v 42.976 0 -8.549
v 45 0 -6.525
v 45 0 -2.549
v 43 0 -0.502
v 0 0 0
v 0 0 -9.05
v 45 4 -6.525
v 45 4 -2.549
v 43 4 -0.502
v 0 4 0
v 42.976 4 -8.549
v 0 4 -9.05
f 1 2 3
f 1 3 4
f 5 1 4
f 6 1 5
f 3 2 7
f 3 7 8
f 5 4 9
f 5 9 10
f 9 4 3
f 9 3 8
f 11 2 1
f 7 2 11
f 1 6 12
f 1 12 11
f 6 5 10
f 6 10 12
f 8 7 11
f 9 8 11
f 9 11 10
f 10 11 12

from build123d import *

# Parameters (mm, degrees)
BOSS_EXTRUDE1_DEPTH   = 4
CHAMFER2_SIZE2        = 2
CHAMFER2_SIZE         = 2.023746482
CHAMFER2_EDGE_2_SIZE2 = 2
CHAMFER2_EDGE_2_SIZE  = 2.023746482


with BuildPart() as part:
    # Sketch2 → Boss-Extrude1 (new body)
    with BuildSketch(Plane(origin=(0, 0, 0), x_dir=(1, 0, 0), z_dir=(0, 1, 0))):
        Polygon((0, 9.05), (45, 8.525), (45, 0.525), (0, 0), align=None)
    extrude(amount=BOSS_EXTRUDE1_DEPTH)

    # Chamfer2
    chamfer2_edges = [part.edges().sort_by_distance(p)[0] for p in [
        (45, 2, -8.525),
    ]]
    chamfer(chamfer2_edges, length=CHAMFER2_SIZE, length2=CHAMFER2_SIZE2)

    # Chamfer2 edge 2
    chamfer2_edge_2_edges = [part.edges().sort_by_distance(p)[0] for p in [
        (45, 2, -0.525),
    ]]
    chamfer(chamfer2_edge_2_edges, length=CHAMFER2_EDGE_2_SIZE, length2=CHAMFER2_EDGE_2_SIZE2)


solid = part.part
